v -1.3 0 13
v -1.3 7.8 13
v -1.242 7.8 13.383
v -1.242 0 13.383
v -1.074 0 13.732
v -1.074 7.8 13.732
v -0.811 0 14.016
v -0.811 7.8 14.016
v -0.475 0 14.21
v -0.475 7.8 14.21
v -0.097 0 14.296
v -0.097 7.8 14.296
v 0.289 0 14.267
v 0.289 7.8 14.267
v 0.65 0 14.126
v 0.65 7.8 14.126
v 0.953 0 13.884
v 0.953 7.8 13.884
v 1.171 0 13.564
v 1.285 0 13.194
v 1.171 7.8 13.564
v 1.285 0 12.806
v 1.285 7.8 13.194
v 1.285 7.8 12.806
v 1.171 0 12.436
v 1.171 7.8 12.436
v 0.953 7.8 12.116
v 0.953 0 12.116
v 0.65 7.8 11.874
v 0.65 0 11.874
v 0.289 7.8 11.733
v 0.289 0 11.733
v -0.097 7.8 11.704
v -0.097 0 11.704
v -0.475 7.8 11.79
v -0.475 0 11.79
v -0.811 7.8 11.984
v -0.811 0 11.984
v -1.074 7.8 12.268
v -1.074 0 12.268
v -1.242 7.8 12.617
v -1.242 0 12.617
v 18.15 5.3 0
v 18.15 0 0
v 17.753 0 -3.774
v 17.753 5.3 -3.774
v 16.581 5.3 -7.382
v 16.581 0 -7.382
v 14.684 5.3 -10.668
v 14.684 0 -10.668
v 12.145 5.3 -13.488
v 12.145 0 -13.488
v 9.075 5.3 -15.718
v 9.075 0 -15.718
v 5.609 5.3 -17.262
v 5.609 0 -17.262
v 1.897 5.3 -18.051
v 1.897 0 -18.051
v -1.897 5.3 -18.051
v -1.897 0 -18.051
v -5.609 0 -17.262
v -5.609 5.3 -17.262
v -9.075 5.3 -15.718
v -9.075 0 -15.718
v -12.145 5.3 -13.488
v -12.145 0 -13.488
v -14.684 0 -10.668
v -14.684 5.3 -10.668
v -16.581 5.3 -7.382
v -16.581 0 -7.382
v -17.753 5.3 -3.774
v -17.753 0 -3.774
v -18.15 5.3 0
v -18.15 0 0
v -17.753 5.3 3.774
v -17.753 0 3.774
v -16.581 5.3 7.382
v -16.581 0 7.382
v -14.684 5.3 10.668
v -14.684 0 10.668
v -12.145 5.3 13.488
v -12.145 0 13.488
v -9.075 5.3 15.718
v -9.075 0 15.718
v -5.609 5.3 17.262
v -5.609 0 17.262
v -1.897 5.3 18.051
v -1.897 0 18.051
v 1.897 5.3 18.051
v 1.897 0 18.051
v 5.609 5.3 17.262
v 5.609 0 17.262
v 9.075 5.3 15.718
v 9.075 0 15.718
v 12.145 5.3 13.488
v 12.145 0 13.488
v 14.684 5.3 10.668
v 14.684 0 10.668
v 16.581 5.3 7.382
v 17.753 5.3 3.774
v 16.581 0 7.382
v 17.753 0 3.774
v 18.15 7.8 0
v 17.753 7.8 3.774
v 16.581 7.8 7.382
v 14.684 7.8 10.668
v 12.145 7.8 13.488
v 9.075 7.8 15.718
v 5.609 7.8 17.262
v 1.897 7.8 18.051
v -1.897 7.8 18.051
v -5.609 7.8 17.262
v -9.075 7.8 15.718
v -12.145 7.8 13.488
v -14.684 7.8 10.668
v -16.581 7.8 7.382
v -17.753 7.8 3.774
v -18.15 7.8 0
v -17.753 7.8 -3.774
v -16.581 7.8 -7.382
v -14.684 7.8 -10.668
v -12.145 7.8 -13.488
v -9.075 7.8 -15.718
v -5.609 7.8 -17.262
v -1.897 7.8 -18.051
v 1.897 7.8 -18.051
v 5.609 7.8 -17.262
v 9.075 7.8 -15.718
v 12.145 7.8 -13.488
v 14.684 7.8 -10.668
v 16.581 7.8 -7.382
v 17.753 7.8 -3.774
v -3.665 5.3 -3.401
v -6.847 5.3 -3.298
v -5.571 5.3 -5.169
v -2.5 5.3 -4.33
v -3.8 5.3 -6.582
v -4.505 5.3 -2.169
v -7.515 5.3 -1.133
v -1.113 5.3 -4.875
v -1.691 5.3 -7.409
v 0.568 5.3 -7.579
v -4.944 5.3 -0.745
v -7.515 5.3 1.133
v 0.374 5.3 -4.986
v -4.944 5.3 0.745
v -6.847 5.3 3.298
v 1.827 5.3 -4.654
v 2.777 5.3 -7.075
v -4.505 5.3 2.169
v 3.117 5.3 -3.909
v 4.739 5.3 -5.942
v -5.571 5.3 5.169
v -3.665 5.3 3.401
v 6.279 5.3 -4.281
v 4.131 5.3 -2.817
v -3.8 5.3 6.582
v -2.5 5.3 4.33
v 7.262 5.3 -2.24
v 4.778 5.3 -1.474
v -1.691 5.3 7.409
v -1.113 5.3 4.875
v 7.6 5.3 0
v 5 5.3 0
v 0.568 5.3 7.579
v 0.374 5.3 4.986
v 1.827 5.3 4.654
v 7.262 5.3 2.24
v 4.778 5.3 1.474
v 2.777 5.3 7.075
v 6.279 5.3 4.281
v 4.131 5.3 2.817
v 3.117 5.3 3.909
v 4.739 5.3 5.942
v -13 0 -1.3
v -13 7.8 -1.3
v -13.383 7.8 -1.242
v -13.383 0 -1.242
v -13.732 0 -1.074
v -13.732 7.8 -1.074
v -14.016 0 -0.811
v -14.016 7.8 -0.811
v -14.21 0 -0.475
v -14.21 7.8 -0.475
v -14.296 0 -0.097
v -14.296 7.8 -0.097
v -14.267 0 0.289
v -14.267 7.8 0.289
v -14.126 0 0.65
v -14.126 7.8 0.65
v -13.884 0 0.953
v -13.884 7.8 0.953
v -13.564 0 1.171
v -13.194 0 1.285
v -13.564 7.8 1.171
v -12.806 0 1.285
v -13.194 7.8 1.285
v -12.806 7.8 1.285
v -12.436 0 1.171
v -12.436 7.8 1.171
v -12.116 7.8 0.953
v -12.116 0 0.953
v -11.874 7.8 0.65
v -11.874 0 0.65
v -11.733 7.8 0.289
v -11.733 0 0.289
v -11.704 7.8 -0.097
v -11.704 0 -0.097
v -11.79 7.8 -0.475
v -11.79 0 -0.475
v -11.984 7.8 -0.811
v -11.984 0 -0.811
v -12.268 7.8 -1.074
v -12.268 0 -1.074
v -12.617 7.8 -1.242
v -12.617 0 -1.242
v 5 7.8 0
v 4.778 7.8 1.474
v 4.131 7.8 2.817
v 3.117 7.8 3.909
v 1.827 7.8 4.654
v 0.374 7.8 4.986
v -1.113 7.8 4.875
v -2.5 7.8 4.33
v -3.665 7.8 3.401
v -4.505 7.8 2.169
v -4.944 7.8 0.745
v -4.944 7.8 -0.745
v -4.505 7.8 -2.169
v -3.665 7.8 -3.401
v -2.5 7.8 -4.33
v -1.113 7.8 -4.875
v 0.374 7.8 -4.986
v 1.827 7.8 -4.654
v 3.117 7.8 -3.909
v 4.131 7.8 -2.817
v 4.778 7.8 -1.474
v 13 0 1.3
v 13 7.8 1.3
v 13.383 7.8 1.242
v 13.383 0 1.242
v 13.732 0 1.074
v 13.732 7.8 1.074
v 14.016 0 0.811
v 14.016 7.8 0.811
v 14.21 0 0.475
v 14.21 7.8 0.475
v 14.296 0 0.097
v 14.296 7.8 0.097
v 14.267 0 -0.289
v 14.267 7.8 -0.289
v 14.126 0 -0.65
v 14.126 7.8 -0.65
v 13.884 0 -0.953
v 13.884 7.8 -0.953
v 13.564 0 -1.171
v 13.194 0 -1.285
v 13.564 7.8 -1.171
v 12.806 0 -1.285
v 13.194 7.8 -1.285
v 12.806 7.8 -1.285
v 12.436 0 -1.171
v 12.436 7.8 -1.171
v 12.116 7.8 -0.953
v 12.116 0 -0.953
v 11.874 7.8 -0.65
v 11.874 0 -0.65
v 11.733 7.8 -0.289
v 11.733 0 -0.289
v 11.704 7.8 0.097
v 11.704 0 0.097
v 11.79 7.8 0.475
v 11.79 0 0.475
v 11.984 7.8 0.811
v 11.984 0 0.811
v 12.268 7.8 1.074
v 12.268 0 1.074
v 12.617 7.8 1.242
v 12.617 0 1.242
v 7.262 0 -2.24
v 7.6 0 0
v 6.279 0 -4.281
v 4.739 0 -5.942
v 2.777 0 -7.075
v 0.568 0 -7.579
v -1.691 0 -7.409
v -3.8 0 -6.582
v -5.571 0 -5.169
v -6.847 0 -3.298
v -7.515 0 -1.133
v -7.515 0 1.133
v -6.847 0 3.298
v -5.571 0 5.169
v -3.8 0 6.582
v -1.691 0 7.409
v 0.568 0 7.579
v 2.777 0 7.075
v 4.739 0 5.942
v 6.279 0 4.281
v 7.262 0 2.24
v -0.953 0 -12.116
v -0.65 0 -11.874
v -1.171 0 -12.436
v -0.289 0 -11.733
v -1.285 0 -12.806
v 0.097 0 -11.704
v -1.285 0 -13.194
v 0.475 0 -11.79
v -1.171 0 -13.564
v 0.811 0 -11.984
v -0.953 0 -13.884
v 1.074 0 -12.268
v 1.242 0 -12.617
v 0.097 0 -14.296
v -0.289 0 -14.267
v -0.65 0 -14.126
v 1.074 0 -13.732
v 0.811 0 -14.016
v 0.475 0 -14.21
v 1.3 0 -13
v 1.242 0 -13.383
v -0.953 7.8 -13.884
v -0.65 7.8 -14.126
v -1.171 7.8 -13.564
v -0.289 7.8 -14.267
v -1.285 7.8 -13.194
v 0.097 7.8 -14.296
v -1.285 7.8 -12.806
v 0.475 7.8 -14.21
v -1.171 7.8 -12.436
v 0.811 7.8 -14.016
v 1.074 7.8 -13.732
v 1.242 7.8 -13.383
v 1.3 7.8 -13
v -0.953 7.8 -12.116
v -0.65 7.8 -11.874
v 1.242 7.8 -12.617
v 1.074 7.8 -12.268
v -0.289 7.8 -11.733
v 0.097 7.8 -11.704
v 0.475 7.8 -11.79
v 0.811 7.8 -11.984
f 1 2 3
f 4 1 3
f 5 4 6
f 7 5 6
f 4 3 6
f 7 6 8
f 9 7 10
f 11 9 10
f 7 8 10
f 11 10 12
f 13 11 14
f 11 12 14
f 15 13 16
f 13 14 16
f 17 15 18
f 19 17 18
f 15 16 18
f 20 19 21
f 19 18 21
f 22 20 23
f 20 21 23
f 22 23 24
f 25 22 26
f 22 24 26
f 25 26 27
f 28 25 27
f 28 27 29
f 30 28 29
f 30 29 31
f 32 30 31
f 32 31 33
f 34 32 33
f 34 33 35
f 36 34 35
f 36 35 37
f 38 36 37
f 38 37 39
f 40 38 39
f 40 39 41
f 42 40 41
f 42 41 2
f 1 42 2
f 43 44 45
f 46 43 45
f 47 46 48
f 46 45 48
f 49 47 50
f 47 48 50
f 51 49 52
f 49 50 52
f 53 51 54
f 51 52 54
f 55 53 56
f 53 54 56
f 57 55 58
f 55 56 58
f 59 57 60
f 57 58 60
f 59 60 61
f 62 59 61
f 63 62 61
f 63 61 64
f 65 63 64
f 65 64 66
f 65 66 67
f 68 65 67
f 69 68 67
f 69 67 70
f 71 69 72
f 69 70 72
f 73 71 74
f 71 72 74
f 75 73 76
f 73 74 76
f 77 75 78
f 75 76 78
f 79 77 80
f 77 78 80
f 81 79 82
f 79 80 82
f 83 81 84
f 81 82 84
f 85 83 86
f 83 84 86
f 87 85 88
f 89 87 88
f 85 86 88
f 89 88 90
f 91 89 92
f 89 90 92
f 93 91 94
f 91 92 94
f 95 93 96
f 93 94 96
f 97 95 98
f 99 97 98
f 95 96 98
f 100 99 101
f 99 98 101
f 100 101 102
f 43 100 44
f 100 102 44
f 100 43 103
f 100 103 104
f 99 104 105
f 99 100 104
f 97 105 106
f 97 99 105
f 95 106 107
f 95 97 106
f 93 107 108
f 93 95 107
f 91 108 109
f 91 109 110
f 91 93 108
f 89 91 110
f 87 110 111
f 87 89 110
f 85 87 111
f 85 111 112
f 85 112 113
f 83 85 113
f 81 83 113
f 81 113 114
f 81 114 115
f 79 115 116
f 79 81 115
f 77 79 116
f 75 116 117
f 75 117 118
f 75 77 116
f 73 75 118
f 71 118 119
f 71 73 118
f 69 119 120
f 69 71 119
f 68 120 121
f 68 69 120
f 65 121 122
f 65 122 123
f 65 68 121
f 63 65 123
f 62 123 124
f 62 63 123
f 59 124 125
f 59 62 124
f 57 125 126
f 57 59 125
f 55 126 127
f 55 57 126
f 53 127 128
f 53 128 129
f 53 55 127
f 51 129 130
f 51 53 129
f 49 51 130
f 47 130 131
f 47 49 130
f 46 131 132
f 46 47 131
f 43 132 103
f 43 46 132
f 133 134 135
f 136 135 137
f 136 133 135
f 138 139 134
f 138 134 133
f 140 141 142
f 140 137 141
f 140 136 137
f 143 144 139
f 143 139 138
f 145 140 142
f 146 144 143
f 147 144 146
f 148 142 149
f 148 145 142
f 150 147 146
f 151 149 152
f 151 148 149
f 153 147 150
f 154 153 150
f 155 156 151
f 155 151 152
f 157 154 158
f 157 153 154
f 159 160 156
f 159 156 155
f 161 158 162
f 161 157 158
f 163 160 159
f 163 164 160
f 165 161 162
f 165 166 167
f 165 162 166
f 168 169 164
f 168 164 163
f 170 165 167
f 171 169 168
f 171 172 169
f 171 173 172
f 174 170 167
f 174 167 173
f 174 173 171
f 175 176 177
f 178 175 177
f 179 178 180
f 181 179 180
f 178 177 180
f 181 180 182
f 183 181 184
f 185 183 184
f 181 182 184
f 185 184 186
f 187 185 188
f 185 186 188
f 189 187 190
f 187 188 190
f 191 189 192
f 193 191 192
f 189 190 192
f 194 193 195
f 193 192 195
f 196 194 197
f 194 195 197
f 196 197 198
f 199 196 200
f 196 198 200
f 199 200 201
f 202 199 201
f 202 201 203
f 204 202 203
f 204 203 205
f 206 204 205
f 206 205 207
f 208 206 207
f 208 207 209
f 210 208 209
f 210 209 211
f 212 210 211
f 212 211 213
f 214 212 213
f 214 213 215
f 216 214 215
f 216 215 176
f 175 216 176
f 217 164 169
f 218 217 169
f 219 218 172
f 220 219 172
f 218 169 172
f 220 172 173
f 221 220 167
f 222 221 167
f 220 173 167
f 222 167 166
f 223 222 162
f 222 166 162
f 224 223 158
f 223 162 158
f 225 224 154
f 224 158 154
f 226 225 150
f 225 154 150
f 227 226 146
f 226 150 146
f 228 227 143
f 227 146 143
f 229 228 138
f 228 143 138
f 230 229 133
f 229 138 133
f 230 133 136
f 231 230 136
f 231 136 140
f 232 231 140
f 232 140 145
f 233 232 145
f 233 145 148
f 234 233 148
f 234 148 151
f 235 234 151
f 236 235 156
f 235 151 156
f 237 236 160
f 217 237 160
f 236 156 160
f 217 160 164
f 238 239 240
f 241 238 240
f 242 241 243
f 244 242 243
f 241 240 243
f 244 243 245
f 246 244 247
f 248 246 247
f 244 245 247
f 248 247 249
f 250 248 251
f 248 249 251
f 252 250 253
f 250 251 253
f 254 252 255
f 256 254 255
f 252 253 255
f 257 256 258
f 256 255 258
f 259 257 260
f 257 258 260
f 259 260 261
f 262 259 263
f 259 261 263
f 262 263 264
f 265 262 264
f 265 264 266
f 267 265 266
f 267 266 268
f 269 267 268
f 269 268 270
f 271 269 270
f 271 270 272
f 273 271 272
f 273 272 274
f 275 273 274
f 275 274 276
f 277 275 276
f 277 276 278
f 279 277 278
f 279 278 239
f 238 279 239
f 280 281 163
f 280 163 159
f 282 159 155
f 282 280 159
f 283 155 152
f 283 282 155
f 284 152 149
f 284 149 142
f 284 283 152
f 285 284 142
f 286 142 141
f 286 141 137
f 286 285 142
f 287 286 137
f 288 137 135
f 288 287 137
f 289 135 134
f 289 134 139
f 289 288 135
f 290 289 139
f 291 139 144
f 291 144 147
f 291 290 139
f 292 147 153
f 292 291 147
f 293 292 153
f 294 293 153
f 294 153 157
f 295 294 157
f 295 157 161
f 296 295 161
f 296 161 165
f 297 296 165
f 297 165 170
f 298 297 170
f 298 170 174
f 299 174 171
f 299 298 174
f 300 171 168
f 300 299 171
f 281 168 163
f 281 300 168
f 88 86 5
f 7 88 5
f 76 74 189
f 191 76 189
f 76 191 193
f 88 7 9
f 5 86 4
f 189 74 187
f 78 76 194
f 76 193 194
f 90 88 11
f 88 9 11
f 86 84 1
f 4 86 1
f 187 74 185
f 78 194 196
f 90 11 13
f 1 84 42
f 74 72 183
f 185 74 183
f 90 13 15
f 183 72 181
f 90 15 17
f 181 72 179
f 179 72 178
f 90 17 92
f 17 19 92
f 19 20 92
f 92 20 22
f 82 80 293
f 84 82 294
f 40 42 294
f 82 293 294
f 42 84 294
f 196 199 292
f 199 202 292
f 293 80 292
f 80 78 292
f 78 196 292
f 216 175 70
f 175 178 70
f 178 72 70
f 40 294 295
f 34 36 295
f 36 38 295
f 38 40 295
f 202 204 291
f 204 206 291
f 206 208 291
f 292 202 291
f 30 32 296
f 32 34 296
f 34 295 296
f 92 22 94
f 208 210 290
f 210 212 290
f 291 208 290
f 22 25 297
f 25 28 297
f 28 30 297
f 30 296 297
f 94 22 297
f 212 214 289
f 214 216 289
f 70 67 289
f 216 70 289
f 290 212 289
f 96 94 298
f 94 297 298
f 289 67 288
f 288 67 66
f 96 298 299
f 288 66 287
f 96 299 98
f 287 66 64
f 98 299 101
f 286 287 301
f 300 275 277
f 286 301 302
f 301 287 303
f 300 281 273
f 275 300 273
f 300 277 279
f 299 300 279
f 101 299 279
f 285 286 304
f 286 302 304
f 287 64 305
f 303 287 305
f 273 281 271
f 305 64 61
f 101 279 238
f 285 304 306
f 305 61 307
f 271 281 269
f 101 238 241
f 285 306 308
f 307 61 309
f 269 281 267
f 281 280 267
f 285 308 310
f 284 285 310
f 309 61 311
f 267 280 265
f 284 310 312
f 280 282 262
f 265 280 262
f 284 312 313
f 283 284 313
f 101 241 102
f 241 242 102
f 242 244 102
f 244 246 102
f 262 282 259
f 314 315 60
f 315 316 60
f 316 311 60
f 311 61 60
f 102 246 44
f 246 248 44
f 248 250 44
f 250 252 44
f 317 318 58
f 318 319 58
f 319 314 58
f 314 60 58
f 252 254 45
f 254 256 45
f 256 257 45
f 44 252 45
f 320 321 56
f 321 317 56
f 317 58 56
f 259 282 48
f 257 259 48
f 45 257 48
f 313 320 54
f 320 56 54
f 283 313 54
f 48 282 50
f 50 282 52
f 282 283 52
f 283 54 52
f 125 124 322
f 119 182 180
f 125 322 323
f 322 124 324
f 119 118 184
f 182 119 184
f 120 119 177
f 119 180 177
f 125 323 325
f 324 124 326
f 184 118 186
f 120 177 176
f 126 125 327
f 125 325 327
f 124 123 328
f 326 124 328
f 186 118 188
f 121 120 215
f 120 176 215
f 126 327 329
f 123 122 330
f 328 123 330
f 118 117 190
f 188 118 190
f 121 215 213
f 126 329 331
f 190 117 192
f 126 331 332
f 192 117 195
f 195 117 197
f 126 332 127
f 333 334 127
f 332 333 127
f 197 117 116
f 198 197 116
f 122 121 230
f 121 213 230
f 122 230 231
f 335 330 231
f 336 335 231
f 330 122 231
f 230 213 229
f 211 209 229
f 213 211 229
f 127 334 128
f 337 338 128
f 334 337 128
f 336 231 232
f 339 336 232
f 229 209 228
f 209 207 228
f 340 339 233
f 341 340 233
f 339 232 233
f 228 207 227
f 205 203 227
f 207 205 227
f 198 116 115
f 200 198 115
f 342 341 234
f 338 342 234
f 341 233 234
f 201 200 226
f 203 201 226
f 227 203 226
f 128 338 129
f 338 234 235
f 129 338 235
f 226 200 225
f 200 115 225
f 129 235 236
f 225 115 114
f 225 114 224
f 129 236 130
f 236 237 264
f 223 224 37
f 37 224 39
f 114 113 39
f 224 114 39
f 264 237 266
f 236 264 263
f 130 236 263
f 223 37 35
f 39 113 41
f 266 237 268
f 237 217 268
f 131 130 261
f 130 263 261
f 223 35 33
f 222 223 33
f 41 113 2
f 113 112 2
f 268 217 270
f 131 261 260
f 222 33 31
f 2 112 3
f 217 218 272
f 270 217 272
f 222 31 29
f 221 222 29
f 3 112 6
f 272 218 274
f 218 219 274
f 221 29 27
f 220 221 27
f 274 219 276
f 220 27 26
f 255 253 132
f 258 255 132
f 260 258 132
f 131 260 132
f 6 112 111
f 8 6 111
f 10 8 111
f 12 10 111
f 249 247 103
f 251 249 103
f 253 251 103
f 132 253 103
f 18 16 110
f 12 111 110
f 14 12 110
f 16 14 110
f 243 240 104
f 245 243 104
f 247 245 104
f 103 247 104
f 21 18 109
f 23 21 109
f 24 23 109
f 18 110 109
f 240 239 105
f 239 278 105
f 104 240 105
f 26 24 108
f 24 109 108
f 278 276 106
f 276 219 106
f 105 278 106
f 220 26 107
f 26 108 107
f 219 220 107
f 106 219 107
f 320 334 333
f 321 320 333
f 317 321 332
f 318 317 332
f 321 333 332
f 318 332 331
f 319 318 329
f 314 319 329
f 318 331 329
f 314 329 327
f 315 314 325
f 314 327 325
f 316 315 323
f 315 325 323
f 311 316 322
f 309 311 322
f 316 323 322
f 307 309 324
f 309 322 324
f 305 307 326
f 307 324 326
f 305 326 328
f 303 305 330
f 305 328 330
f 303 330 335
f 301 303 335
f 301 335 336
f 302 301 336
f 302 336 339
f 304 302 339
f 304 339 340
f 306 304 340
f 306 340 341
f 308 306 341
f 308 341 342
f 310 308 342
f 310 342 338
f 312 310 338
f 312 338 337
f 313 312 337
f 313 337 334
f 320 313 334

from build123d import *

# Parameters (mm, degrees)
SKETCH_1_R               = 18.15
SKETCH_1_R_2             = 7.6
EXTRUDE_1_DEPTH          = 5.3
SKETCH_8_R               = 18.15
SKETCH_8_R_2             = 5
EXTRUDE_6_DEPTH          = 2.5
SKETCH_9_R               = 1.3
CUT_EXTRUDE_3_DEPTH      = 8.8
PATTERN_CIRCULAR_1_COUNT = 4


with BuildPart() as part:
    # Эскиз1 → Бобышка-Вытянуть1 (new body)
    with BuildSketch(Plane(origin=(0, 0, 0), x_dir=(1, 0, 0), z_dir=(0, 1, 0))):
        Circle(SKETCH_1_R)
        Circle(SKETCH_1_R_2, mode=Mode.SUBTRACT)
    extrude(amount=EXTRUDE_1_DEPTH)

    # Эскиз8 → Бобышка-Вытянуть6 (add)
    with BuildSketch(Plane.XZ.offset(-5.3)):
        Circle(SKETCH_8_R)
        Circle(SKETCH_8_R_2, mode=Mode.SUBTRACT)
    extrude(amount=-EXTRUDE_6_DEPTH)

    # Эскиз9 → Вырез-Вытянуть3 (cut, through all)
    with BuildSketch(Plane(origin=(0, 7.8, 0), x_dir=(1, 0, 0), z_dir=(0, 1, 0))):
        with Locations((0, 13)):
            Circle(SKETCH_9_R)
    cut_extrude_3 = extrude(amount=-CUT_EXTRUDE_3_DEPTH, mode=Mode.SUBTRACT)

    # Круговой массив1: Вырез-Вытянуть3 ×4 about axis
    pattern_circular_1_axis = Axis((0, 0, 0), (0, 1, 0))
    for i in range(1, PATTERN_CIRCULAR_1_COUNT):
        add(cut_extrude_3.rotate(pattern_circular_1_axis, i * 360 / PATTERN_CIRCULAR_1_COUNT), mode=Mode.SUBTRACT)


solid = part.part
